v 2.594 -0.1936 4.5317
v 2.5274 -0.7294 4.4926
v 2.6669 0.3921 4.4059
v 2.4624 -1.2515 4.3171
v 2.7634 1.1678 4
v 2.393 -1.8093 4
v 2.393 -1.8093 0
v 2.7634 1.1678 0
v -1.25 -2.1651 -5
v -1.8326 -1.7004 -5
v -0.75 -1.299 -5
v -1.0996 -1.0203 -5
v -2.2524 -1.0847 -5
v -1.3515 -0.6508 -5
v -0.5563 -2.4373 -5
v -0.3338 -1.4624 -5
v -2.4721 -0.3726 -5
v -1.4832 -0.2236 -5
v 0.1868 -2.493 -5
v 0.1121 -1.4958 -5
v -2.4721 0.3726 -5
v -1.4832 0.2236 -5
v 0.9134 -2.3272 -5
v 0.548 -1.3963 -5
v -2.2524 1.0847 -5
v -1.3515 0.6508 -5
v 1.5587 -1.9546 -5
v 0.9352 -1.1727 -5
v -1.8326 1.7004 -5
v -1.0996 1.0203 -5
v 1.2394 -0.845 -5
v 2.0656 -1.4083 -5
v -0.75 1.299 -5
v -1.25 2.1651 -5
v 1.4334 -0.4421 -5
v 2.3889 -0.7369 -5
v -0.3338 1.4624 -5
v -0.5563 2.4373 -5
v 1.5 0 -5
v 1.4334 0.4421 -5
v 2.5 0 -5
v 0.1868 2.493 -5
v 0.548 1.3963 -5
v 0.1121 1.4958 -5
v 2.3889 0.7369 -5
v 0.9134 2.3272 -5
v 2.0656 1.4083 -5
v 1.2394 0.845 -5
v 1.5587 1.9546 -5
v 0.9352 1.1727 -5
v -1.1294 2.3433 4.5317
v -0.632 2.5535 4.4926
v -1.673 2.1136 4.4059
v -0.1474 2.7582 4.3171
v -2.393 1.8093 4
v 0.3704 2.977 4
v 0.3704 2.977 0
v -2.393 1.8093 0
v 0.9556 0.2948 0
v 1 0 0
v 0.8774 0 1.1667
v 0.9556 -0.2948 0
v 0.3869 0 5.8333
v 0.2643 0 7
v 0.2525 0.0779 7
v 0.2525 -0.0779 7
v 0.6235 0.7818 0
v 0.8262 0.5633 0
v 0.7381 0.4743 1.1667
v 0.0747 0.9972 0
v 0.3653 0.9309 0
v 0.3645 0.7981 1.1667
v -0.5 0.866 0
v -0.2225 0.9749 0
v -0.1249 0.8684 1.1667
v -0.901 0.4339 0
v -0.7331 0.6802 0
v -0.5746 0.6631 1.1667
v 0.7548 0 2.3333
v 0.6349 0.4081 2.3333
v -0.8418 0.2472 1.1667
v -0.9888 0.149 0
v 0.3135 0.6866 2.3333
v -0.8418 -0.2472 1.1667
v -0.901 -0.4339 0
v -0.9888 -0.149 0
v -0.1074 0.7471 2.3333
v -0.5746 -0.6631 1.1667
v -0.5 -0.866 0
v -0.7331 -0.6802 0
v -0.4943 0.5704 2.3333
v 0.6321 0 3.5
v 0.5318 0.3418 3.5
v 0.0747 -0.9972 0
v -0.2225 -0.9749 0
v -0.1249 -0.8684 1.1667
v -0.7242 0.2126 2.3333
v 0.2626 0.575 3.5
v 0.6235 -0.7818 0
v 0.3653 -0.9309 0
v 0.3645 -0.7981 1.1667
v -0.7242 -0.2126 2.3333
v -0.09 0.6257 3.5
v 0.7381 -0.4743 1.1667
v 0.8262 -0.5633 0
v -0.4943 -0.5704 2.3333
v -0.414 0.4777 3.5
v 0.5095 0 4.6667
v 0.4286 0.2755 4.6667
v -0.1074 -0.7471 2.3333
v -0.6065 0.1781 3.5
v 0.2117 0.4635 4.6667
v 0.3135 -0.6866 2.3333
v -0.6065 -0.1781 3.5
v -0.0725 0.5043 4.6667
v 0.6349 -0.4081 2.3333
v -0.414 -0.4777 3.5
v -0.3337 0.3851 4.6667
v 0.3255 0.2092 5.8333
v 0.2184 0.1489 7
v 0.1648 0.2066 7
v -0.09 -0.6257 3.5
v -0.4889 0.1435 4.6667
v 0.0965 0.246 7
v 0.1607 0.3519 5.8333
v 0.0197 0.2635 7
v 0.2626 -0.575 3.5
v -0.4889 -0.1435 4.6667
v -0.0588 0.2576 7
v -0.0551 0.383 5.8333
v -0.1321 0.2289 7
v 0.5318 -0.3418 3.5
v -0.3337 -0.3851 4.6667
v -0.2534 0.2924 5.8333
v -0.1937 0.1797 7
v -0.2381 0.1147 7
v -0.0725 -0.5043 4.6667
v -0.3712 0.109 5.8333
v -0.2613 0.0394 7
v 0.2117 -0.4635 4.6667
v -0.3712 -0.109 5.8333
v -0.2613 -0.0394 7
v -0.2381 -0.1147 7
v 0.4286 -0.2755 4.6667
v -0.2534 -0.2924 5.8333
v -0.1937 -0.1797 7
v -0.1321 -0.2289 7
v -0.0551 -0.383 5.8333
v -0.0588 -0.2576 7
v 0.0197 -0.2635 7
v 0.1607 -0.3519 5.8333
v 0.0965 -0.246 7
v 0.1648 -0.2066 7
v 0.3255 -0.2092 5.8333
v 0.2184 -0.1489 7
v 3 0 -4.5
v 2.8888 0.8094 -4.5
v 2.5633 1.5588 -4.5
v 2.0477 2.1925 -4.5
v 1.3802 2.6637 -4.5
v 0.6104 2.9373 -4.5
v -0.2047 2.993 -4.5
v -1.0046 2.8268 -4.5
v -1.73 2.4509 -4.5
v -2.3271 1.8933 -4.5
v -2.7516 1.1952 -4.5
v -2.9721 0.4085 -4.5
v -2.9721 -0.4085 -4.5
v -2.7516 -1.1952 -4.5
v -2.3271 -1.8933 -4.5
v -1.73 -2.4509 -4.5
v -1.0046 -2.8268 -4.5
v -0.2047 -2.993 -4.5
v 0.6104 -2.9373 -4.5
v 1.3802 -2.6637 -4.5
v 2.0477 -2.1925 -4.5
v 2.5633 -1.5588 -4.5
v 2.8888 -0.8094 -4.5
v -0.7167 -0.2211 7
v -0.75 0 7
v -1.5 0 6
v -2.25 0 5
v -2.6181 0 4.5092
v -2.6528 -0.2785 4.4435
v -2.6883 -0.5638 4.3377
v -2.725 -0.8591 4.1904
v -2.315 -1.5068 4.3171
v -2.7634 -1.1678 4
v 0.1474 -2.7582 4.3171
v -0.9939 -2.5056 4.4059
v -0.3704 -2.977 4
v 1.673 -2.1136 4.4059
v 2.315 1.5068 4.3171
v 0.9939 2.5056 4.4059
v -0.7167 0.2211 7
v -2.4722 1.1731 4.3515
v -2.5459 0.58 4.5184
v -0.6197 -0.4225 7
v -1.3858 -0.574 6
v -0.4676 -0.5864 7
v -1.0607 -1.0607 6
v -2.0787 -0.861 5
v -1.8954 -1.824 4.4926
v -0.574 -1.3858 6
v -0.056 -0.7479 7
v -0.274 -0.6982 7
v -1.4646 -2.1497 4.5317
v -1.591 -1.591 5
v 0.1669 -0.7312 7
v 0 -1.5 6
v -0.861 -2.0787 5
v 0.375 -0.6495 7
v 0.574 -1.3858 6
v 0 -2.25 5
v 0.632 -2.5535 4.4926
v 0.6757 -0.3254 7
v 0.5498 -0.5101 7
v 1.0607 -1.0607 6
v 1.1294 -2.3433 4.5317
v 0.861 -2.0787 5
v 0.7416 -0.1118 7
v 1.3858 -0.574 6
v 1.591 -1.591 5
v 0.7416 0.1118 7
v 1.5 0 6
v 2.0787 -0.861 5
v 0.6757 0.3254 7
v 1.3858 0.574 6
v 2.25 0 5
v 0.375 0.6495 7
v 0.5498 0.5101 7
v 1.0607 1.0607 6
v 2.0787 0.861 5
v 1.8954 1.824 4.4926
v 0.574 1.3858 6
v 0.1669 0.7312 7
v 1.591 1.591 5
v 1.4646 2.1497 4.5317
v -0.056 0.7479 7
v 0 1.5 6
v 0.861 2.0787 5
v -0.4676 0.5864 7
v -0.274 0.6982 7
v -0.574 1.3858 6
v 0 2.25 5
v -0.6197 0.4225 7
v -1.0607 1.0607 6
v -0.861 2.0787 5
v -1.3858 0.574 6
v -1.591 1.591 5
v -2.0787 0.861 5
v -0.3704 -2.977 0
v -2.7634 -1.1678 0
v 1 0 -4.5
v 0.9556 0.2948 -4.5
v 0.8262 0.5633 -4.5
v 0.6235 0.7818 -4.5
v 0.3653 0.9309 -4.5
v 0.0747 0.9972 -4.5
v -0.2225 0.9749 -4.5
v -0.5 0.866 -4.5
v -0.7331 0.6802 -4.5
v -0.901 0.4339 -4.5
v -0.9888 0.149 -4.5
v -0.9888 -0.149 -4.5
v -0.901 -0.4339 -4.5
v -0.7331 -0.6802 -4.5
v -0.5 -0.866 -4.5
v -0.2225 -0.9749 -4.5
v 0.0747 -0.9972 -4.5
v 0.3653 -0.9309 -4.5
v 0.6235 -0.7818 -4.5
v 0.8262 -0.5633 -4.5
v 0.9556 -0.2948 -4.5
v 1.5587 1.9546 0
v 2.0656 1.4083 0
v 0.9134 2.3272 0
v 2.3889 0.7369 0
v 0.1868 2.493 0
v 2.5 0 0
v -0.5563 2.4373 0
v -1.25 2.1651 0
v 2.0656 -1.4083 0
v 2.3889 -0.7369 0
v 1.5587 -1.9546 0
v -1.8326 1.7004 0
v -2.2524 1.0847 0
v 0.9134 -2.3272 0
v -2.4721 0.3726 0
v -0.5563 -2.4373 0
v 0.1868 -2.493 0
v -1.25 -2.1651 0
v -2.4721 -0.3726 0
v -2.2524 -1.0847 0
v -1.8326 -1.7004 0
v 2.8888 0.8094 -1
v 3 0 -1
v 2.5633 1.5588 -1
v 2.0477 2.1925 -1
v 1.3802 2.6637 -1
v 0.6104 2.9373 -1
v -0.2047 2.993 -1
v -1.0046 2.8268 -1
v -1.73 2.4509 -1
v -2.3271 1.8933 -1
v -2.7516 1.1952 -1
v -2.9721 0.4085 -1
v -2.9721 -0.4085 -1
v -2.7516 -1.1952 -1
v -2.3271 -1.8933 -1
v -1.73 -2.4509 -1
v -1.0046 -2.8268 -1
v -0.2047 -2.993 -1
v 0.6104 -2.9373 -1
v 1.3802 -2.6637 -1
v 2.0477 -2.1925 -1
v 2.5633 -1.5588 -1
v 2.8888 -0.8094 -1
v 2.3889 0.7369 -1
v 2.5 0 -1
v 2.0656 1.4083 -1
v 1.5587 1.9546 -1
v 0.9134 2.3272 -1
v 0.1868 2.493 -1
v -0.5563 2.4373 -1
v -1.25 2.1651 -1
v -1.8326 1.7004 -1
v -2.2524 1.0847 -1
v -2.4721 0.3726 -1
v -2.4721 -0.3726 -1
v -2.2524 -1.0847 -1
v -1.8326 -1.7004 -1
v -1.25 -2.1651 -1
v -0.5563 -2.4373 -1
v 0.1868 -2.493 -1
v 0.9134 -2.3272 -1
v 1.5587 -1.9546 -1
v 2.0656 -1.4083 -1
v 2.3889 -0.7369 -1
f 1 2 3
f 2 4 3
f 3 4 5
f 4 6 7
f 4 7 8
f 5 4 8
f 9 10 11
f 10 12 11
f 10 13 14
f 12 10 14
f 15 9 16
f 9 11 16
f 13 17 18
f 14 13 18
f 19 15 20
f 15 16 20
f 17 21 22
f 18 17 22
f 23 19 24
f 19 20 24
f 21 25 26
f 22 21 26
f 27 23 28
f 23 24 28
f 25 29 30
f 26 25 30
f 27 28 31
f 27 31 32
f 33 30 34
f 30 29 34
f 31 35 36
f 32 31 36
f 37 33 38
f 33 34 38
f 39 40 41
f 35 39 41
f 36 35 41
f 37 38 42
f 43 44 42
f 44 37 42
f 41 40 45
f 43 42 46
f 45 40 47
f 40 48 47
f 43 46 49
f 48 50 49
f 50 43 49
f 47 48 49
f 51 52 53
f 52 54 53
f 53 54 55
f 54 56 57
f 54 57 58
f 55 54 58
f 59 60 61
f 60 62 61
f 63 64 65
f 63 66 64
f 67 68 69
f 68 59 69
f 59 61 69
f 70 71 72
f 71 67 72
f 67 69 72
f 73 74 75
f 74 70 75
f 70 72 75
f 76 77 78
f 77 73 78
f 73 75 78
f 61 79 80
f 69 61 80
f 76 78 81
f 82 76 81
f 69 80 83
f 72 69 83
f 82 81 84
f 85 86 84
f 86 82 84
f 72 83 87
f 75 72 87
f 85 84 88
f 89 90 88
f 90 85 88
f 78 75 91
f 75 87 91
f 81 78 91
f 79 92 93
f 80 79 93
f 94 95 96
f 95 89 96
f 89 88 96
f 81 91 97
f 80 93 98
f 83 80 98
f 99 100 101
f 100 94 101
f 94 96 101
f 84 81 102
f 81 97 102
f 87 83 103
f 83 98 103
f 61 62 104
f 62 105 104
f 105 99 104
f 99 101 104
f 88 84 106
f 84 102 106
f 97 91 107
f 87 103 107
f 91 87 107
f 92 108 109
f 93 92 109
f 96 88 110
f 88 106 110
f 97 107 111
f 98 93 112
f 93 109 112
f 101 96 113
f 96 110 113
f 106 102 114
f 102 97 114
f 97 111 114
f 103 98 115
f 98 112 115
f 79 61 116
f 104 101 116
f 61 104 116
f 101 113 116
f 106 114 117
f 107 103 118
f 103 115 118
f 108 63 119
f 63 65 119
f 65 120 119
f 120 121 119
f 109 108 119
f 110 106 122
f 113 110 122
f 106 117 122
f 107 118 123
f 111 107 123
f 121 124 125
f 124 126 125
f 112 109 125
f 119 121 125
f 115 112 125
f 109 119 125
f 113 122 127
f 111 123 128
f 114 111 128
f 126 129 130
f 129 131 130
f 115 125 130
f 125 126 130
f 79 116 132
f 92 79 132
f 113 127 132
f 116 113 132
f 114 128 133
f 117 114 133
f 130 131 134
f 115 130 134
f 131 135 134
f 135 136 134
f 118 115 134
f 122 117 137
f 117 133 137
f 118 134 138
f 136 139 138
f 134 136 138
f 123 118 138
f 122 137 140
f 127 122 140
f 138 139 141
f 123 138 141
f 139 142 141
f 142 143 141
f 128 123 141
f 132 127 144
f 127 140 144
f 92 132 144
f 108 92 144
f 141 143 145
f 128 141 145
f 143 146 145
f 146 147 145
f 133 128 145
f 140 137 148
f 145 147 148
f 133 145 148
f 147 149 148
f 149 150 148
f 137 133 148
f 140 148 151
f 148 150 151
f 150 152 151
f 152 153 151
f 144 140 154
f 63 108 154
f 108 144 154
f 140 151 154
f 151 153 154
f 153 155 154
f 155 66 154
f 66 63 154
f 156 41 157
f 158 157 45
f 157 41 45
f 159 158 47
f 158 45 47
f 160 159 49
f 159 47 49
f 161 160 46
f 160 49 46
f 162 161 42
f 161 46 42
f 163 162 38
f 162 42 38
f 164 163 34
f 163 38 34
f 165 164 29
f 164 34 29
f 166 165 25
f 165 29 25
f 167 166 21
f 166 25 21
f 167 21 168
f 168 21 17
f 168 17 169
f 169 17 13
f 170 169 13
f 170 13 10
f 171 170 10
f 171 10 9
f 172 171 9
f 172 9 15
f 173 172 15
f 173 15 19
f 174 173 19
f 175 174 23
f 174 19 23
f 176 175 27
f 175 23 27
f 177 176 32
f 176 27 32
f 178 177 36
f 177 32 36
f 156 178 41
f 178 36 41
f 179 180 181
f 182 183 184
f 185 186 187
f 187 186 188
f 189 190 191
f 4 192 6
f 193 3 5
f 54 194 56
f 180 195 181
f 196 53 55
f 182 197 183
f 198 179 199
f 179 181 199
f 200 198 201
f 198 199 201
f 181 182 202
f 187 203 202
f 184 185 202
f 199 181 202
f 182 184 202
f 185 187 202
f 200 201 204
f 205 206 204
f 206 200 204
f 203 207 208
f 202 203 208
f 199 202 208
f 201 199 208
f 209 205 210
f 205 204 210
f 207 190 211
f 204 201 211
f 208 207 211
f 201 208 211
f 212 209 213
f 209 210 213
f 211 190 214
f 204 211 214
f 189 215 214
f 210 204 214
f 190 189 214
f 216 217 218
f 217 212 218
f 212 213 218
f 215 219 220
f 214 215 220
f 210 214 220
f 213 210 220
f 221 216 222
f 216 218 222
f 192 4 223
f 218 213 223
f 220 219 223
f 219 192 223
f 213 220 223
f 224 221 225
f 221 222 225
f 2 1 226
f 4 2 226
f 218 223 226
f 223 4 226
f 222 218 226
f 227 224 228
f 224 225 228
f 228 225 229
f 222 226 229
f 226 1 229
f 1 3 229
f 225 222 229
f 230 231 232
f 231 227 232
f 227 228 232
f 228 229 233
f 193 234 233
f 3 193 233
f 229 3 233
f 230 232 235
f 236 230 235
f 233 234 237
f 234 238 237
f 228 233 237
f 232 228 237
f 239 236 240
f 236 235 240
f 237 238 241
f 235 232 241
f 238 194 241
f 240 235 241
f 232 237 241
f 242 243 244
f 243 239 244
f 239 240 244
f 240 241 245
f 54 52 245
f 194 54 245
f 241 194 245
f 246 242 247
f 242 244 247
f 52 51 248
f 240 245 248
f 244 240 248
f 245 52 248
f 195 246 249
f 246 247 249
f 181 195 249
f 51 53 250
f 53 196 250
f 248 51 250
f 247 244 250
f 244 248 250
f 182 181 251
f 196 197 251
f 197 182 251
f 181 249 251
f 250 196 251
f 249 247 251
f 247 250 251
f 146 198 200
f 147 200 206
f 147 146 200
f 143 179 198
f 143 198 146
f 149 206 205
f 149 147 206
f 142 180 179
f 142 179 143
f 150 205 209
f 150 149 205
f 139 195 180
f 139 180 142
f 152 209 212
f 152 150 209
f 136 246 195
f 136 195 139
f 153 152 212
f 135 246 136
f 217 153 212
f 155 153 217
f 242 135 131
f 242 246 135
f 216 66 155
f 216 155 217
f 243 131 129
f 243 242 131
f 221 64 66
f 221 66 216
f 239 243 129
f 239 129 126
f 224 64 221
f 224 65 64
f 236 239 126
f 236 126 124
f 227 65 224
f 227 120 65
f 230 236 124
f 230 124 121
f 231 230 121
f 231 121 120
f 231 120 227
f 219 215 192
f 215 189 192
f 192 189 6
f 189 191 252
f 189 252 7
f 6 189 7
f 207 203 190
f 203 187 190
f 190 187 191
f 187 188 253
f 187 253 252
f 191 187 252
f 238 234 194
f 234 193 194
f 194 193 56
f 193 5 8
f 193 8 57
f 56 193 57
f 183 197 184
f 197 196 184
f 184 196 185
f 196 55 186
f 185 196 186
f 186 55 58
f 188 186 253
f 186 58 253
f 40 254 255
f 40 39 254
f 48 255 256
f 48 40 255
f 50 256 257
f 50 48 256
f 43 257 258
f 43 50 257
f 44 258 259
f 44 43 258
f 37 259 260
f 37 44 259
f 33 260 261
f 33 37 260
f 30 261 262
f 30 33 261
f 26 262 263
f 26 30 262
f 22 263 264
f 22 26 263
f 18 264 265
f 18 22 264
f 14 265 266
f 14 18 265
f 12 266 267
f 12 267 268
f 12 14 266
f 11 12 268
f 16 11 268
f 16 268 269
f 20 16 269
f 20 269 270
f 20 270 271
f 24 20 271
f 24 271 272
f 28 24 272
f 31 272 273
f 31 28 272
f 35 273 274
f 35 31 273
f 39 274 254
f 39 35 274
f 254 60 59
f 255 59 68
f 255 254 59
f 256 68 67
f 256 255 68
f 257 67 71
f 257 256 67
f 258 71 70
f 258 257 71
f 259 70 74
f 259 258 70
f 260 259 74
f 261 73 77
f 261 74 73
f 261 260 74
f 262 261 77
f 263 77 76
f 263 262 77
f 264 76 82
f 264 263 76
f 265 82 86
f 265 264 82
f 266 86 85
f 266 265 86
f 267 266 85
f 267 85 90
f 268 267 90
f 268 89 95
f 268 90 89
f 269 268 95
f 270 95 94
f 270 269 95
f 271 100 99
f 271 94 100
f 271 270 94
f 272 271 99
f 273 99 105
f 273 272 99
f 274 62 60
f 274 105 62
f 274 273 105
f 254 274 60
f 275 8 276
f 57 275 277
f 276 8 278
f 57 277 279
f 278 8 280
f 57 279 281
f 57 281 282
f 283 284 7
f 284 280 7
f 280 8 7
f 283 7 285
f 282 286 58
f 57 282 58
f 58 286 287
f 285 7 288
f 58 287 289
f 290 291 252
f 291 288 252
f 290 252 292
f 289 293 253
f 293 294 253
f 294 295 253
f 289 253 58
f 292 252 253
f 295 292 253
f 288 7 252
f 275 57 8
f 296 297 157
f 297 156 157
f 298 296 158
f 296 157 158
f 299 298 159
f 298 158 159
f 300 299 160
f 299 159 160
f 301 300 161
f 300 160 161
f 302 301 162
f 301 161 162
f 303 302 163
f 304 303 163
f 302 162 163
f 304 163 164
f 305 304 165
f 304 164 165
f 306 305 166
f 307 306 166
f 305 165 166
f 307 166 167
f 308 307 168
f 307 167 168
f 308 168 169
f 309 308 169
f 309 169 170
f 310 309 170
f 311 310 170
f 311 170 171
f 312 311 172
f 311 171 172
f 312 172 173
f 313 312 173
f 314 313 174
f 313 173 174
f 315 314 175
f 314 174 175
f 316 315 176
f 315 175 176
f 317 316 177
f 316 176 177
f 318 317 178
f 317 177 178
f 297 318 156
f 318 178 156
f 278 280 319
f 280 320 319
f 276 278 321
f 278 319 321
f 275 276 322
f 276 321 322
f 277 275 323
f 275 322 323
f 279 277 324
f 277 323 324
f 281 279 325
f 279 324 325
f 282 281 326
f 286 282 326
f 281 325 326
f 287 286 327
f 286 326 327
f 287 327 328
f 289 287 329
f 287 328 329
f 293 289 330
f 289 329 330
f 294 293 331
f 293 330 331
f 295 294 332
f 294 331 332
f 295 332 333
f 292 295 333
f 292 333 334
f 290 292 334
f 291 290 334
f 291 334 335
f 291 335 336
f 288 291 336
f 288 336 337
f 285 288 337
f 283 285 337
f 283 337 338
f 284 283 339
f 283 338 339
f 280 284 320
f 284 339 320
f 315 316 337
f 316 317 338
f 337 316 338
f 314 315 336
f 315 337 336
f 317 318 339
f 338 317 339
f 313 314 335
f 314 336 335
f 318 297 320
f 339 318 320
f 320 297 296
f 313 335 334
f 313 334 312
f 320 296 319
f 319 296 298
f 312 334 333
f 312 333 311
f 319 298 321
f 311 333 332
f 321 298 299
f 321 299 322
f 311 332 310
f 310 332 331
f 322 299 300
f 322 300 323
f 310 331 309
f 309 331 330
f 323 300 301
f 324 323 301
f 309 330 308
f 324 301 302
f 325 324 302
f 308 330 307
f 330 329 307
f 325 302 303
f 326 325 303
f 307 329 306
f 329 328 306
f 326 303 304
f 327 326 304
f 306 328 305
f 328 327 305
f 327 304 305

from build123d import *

# Parameters (mm, degrees)
CROQUIS8_W            = 2.174939389
CROQUIS8_H            = 2.19283881
CORTAR_EXTRUIR2_DEPTH = 10
CROQUIS11_R           = 1
CORTAR_EXTRUIR3_DEPTH = 9.185352772
CORTAR_EXTRUIR3_TAPER = 6
CROQUIS13_OUTSIDE_W   = 10.94
CROQUIS13_OUTSIDE_H   = 10.94
CORTAR_EXTRUIR4_DEPTH = 10


with BuildPart() as part:
    # Croquis1 → Revolución1 (revolve)
    with BuildSketch(Plane(origin=(0, 0, 0), x_dir=(1, 0, 0), z_dir=(0, 1, 0))):
        Polygon((2.5, 5), (0, 5), (0, 0), (2.5, 0), (2.5, 1), (3, 1), (3, 4.5), align=None)
    revolve(axis=Axis((0, 0, -5), (0, 0, 1)))

    # Croquis2 → Cortar-Revolución1 (revolve, cut)
    with BuildSketch(Plane(origin=(0, 0, 0), x_dir=(1, 0, 0), z_dir=(0, 1, 0))):
        Polygon((1.5, 5), (0, 5), (0, -8), (0.2, -8), (0.2, -7.2), (1, -6.4), (1, 4.5), align=None)
    revolve(axis=Axis((0, 0, -5), (0, 0, 1)), mode=Mode.SUBTRACT)

    # Croquis4 → Revolución2 (revolve)
    with BuildSketch(Plane(origin=(0, 0, 0), x_dir=(1, 0, 0), z_dir=(0, 1, 0)), mode=Mode.PRIVATE) as revoluci_n2_sk:
        Polygon((0, 0), (0, -8), (3, -4), (3, 0), align=None)
    revolve(revoluci_n2_sk.sketch.rotate(Axis((0, 0, 0), (0, 0, 1)), 180), axis=Axis((0, 0, 0), (0, 0, 1)))

    # Croquis8 → Cortar-Extruir2 (cut)
    with BuildSketch(Plane.XY.offset(7)):
        with Locations((-0.052168773, -0.007828758)):
            Rectangle(CROQUIS8_W, CROQUIS8_H)
    extrude(amount=CORTAR_EXTRUIR2_DEPTH, mode=Mode.SUBTRACT)

    # Croquis11 → Cortar-Extruir3 (cut, through all)
    with BuildSketch(Plane.XY):
        Circle(CROQUIS11_R)
    extrude(amount=CORTAR_EXTRUIR3_DEPTH, taper=CORTAR_EXTRUIR3_TAPER, mode=Mode.SUBTRACT)

    # Croquis13 outside → Cortar-Extruir4 (cut)
    with BuildSketch(Plane.XY):
        Rectangle(CROQUIS13_OUTSIDE_W, CROQUIS13_OUTSIDE_H)
        Polygon((2.763390844, 1.167763265), (0.370382769, 2.977048304), (-2.393008075, 1.809285039), (-2.763390844, -1.167763265), (-0.370382769, -2.977048304), (2.393008075, -1.809285039), align=None, mode=Mode.SUBTRACT)
    extrude(amount=CORTAR_EXTRUIR4_DEPTH, mode=Mode.SUBTRACT)


solid = part.part
